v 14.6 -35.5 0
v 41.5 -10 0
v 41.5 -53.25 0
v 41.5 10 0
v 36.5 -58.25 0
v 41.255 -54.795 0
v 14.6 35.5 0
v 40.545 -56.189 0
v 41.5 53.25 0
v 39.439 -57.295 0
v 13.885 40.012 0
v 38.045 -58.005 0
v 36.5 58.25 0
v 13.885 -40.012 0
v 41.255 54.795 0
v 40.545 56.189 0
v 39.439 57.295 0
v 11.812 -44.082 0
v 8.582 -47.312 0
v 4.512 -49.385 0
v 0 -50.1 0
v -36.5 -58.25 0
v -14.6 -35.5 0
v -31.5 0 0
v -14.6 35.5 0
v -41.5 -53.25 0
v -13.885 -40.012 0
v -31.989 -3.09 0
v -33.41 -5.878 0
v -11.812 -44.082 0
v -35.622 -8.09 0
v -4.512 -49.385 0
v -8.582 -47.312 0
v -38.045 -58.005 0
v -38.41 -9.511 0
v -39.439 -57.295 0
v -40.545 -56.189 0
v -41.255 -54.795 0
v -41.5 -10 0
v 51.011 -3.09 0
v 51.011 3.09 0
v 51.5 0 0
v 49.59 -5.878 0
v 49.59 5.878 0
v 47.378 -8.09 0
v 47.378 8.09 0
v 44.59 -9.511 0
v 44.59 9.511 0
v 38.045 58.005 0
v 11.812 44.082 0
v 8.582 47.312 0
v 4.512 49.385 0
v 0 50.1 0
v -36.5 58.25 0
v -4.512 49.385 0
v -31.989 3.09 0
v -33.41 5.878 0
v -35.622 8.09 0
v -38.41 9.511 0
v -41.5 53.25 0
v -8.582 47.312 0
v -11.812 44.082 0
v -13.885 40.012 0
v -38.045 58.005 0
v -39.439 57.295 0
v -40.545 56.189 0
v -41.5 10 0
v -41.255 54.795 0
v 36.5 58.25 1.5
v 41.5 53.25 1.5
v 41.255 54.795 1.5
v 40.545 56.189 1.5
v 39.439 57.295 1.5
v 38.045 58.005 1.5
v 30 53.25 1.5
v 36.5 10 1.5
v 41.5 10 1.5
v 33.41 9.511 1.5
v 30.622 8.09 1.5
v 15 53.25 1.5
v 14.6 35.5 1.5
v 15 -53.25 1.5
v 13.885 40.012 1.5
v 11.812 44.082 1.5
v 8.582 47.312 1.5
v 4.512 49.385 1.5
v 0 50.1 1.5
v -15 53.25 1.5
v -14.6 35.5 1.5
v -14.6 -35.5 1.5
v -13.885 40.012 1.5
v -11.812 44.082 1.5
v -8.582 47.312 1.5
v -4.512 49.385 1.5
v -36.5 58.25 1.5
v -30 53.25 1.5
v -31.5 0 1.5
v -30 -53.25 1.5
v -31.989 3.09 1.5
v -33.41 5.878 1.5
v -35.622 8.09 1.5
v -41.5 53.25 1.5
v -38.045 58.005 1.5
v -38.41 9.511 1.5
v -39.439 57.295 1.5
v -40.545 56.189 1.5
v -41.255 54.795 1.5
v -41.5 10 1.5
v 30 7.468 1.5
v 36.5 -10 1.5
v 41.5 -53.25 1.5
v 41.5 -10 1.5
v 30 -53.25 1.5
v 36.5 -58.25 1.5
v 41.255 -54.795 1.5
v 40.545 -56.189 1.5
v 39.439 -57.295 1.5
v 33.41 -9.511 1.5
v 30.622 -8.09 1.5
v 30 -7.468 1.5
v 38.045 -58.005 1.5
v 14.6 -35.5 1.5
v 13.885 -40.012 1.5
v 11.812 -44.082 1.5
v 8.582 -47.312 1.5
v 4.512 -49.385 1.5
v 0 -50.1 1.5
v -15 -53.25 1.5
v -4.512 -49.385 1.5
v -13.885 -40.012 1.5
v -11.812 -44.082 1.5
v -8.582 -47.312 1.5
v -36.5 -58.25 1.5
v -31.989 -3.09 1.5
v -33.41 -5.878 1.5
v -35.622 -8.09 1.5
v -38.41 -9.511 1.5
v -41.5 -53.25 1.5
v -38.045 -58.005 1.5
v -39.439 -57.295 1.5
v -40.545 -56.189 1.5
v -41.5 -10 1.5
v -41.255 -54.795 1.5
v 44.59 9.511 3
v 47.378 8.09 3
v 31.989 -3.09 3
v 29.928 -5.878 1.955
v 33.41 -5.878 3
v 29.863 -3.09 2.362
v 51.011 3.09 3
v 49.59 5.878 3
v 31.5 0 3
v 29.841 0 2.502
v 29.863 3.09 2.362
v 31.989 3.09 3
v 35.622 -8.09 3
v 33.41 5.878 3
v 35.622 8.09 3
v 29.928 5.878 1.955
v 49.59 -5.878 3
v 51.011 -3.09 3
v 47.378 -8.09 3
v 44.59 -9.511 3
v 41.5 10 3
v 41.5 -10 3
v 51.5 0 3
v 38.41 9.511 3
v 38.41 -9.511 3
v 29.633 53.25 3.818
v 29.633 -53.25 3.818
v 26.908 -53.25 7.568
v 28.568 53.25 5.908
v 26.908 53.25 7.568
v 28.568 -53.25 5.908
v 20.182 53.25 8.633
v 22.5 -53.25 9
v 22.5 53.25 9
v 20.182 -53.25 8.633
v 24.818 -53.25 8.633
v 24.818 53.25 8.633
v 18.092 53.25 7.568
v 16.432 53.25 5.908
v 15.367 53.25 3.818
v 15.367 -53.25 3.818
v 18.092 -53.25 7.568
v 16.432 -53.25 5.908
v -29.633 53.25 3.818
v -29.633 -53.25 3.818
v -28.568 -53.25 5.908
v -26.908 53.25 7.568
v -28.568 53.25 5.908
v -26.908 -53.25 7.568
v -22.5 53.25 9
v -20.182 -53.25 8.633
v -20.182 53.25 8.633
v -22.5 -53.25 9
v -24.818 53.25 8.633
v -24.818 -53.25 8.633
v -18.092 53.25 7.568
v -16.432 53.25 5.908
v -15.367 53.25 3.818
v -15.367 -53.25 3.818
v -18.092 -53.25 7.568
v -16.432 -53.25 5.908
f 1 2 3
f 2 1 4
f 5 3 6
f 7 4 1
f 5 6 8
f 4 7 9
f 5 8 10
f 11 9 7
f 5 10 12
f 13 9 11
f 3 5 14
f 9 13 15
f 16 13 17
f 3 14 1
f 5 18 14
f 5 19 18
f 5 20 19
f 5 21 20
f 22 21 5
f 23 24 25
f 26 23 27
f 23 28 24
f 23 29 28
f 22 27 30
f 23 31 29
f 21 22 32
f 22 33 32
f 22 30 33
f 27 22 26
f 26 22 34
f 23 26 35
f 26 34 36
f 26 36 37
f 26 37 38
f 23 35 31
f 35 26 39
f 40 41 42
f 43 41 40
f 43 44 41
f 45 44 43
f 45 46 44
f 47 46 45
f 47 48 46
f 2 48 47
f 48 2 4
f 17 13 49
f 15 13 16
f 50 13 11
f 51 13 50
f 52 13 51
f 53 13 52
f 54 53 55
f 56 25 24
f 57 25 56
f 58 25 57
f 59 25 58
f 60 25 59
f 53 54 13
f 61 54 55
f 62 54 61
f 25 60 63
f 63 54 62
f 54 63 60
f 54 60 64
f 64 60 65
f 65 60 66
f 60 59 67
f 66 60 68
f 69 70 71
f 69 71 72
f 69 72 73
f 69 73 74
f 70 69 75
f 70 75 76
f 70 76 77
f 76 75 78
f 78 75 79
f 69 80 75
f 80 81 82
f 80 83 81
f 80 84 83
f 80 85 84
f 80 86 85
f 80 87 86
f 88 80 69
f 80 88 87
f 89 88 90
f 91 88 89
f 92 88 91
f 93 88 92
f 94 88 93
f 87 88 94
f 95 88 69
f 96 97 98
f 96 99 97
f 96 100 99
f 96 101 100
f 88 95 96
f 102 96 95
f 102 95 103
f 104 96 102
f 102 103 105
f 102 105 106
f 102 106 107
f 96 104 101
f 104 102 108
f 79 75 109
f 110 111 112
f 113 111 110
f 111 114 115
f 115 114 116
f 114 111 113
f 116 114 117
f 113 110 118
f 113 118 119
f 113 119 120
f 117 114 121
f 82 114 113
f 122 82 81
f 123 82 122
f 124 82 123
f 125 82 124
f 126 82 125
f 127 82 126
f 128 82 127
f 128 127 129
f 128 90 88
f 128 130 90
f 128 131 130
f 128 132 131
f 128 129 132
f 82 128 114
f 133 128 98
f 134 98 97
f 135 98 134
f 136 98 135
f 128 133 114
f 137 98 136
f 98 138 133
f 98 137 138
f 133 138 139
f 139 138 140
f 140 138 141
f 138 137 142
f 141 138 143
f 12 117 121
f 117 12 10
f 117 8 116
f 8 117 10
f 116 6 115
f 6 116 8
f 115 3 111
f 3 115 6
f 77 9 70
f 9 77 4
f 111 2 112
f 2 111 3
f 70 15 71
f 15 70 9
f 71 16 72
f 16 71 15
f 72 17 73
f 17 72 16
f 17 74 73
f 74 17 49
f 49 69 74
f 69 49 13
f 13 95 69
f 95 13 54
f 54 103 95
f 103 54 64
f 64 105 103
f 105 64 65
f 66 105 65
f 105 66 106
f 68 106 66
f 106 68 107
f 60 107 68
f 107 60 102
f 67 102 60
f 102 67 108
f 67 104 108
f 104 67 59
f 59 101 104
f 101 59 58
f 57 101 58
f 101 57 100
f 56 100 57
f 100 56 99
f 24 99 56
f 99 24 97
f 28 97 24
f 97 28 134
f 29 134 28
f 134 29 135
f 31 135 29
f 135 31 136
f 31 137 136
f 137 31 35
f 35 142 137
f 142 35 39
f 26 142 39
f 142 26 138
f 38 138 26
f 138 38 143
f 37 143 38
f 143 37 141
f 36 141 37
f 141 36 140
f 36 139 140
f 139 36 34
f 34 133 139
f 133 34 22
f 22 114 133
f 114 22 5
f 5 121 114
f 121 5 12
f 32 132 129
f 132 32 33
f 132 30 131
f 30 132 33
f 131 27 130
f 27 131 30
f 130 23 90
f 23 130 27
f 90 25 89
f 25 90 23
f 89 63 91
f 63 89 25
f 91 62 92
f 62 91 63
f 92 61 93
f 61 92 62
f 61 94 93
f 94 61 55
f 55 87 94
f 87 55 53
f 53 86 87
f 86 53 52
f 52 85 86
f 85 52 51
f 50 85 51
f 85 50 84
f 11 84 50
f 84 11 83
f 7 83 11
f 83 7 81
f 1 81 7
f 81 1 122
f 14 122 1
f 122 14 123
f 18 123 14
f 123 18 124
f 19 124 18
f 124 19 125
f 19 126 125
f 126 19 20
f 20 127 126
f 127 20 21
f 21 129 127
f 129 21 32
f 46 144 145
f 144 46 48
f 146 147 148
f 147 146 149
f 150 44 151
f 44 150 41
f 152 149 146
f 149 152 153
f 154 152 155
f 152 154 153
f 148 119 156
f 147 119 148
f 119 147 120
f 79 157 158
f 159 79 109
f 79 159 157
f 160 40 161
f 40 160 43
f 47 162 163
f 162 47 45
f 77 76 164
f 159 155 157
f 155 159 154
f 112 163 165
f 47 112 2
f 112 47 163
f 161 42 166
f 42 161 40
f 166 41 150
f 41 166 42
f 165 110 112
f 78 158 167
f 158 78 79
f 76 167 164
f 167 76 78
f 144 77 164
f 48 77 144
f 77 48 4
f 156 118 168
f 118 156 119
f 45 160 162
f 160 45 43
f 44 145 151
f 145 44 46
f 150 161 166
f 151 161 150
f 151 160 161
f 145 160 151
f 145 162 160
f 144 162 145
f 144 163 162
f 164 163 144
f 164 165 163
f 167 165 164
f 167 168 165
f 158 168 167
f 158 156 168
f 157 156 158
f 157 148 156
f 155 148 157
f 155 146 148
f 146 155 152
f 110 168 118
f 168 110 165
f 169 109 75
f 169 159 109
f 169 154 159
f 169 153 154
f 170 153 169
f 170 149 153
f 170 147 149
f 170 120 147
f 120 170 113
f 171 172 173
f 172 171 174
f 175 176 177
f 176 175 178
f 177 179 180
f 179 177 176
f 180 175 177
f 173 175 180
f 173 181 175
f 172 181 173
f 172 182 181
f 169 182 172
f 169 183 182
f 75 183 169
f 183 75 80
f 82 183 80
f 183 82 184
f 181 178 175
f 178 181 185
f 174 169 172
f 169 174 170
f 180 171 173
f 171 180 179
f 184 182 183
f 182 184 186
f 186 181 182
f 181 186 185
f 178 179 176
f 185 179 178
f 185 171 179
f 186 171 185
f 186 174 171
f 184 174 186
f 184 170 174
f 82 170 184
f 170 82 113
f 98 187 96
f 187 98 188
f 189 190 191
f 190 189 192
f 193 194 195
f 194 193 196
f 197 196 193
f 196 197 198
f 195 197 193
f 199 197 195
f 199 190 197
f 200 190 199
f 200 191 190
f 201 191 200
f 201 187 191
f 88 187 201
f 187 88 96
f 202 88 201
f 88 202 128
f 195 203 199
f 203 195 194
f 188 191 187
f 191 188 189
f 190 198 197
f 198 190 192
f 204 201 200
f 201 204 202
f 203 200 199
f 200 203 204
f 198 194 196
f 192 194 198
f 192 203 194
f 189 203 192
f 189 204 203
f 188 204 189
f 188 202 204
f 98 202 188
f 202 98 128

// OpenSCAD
// platform height
p_h = 1.5; 

// can height - between ridges
can_h = 106.5;

// can diameter
can_d = 73;

// bump height
b_h = 15;

// connection length
c_l = 4;

// center_cut percent
c_c = 0.4;

//connection circle
con_d = 10;

//minokowski
min = 5;

// how fine the circles should be, higher is better, lower is faster to render
fn=20;

main();

//connection_attach();
module main() 
{
	main_square();
	bumps();
}



module connection_attach()
{
	hull()
	{
	linear_extrude(height=p_h*2)
	connection_circle();
	translate([-con_d/2,0,0])
	linear_extrude(height=p_h)
	connection_circle();
	}
}


module main_square()
{
	linear_extrude(height=p_h)
	{
	difference()
	{
		minkowski()
		{
		square([can_d, can_h], center=true);
		circle(r=min, $fn=fn);
		}
		hull()
		{
		translate([0,can_h/3,0])
		circle(r=(c_c * can_d/ 2), center=true, $fn=fn);
		translate([0,-can_h/3,0])
		circle(r=(c_c * can_d/ 2), center=true, $fn=fn);
		}
		
		translate([-(can_d/2 +min/2) - con_d/4,0,0])
		connection_circle();
	}

	}
	translate([(can_d/2 + min/2) + con_d/4,0,0])
	connection_attach();
}


module connection_circle()
{
	radius=con_d;
	circle(r=radius, center=true, $fn=fn);
}




module connection()
{
	width=8;
	height=5;
	square([width-3, height], center=true);
	translate([width/2,0,0])
	hull()
	{
	translate([0,width,0])
	circle(r=(c_c * height), center=true, $fn=fn);
	translate([0,-width,0])
	circle(r=(c_c * height), center=true, $fn=fn);
	}
}

module bumps()
{
	offset = 10 + c_l;
	translate([can_d/2 - offset, 0, p_h])
	bump();

	mirror([1,0,0])
	translate([can_d/2 - offset, 0, p_h])
	bump();

}

module bump()
{
	difference()
	{
	rotate([90,0,0])
	cylinder(r=b_h/2, h=can_h, center=true, $fn=fn);
	
	rotate([90,0,0])
	translate([0,-b_h/2,0])
	cube([b_h, b_h, can_h], center=true);
	}
}
